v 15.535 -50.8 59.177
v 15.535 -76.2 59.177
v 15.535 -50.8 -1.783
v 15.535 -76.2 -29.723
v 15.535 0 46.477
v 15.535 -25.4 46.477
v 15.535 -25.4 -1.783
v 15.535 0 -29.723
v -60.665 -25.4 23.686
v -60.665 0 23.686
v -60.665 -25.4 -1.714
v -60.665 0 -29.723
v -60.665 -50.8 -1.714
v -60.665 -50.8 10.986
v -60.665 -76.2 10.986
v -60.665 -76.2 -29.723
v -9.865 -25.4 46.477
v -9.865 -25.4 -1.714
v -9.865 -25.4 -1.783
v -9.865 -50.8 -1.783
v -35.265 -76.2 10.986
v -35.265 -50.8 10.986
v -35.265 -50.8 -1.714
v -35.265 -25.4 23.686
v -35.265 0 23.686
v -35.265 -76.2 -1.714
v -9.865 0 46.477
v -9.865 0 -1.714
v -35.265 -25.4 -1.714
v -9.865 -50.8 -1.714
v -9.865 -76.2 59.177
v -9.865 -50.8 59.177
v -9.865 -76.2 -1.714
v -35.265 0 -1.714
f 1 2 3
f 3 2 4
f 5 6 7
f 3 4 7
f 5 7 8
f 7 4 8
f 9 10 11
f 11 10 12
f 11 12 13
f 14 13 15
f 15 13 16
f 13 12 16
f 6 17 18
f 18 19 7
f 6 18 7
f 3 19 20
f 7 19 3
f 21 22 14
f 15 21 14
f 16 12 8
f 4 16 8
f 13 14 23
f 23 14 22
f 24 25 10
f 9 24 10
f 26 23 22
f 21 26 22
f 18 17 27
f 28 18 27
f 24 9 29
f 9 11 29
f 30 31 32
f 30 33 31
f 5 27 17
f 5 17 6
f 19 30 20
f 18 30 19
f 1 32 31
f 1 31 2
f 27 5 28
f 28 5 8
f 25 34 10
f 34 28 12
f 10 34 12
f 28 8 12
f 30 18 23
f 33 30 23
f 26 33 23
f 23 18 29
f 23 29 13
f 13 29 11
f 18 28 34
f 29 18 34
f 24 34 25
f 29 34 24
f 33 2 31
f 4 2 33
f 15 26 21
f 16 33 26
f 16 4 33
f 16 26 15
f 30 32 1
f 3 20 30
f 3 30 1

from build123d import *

# Parameters (mm, degrees)
F1_DEPTH  = 76.2
F2_W      = 25.4
F2_H      = 25.4
F3_DEPTH  = 38.1
F4_W      = 25.4
F4_H      = 25.4
F5_DEPTH  = 12.7
F6_DEPTH  = 12.7
F7_W      = 25.4
F7_H      = 25.4
F8_DEPTH  = 35.56
F9_DEPTH  = 25.4
F10_DEPTH = 12.7


with BuildPart() as f1:
    # F0 (on Front) → F1 (new body)
    with BuildSketch(Plane.XZ):
        Polygon((-60.6652237475, 10.9855490685), (-60.6652237475, -29.7227894413), (15.5347762525, -29.7227894413), (15.5347762525, 33.7772105587), (-9.8652237475, 33.7772105587), (-9.8652237475, -1.7144509315), (-35.2652237475, -1.7144509315), (-35.2652237475, 10.9855490685), align=None)
    extrude(amount=F1_DEPTH)

    # F2 (on face) → F3 (join)
    with BuildSketch(Plane.XY.offset(33.7772105587)):
        with Locations((2.8347762525, -38.1)):
            Rectangle(F2_W, F2_H)
    extrude(amount=-F3_DEPTH)

    # F4 (on face) → F5 (cut)
    with BuildSketch(Plane.XY.offset(10.9855490685)):
        with Locations((-47.9652237475, -38.1)):
            Rectangle(F4_W, F4_H)
    extrude(amount=-F5_DEPTH, mode=Mode.SUBTRACT)

    # F6 (add): a face of the model
    f6_faces = [f1.faces().sort_by_distance(p)[0] for p in [
        (-47.9652237475, -12.7, 10.9855490685),
    ]]
    extrude(f6_faces, amount=F6_DEPTH)

    # F7 (on face) → F8 (cut)
    with BuildSketch(Plane.XY.offset(33.7772105587)):
        with Locations((2.8347762525, -38.1)):
            Rectangle(F7_W, F7_H)
    extrude(amount=-F8_DEPTH, mode=Mode.SUBTRACT)

    # F9 (add): a face of the model
    f9_faces = [f1.faces().sort_by_distance(p)[0] for p in [
        (2.8347762525, -63.5, 33.7772105587),
    ]]
    extrude(f9_faces, amount=F9_DEPTH)

    # F10 (add): a face of the model
    f10_faces = [f1.faces().sort_by_distance(p)[0] for p in [
        (2.8347762525, -12.7, 33.7772105587),
    ]]
    extrude(f10_faces, amount=F10_DEPTH)


solid = f1.part
